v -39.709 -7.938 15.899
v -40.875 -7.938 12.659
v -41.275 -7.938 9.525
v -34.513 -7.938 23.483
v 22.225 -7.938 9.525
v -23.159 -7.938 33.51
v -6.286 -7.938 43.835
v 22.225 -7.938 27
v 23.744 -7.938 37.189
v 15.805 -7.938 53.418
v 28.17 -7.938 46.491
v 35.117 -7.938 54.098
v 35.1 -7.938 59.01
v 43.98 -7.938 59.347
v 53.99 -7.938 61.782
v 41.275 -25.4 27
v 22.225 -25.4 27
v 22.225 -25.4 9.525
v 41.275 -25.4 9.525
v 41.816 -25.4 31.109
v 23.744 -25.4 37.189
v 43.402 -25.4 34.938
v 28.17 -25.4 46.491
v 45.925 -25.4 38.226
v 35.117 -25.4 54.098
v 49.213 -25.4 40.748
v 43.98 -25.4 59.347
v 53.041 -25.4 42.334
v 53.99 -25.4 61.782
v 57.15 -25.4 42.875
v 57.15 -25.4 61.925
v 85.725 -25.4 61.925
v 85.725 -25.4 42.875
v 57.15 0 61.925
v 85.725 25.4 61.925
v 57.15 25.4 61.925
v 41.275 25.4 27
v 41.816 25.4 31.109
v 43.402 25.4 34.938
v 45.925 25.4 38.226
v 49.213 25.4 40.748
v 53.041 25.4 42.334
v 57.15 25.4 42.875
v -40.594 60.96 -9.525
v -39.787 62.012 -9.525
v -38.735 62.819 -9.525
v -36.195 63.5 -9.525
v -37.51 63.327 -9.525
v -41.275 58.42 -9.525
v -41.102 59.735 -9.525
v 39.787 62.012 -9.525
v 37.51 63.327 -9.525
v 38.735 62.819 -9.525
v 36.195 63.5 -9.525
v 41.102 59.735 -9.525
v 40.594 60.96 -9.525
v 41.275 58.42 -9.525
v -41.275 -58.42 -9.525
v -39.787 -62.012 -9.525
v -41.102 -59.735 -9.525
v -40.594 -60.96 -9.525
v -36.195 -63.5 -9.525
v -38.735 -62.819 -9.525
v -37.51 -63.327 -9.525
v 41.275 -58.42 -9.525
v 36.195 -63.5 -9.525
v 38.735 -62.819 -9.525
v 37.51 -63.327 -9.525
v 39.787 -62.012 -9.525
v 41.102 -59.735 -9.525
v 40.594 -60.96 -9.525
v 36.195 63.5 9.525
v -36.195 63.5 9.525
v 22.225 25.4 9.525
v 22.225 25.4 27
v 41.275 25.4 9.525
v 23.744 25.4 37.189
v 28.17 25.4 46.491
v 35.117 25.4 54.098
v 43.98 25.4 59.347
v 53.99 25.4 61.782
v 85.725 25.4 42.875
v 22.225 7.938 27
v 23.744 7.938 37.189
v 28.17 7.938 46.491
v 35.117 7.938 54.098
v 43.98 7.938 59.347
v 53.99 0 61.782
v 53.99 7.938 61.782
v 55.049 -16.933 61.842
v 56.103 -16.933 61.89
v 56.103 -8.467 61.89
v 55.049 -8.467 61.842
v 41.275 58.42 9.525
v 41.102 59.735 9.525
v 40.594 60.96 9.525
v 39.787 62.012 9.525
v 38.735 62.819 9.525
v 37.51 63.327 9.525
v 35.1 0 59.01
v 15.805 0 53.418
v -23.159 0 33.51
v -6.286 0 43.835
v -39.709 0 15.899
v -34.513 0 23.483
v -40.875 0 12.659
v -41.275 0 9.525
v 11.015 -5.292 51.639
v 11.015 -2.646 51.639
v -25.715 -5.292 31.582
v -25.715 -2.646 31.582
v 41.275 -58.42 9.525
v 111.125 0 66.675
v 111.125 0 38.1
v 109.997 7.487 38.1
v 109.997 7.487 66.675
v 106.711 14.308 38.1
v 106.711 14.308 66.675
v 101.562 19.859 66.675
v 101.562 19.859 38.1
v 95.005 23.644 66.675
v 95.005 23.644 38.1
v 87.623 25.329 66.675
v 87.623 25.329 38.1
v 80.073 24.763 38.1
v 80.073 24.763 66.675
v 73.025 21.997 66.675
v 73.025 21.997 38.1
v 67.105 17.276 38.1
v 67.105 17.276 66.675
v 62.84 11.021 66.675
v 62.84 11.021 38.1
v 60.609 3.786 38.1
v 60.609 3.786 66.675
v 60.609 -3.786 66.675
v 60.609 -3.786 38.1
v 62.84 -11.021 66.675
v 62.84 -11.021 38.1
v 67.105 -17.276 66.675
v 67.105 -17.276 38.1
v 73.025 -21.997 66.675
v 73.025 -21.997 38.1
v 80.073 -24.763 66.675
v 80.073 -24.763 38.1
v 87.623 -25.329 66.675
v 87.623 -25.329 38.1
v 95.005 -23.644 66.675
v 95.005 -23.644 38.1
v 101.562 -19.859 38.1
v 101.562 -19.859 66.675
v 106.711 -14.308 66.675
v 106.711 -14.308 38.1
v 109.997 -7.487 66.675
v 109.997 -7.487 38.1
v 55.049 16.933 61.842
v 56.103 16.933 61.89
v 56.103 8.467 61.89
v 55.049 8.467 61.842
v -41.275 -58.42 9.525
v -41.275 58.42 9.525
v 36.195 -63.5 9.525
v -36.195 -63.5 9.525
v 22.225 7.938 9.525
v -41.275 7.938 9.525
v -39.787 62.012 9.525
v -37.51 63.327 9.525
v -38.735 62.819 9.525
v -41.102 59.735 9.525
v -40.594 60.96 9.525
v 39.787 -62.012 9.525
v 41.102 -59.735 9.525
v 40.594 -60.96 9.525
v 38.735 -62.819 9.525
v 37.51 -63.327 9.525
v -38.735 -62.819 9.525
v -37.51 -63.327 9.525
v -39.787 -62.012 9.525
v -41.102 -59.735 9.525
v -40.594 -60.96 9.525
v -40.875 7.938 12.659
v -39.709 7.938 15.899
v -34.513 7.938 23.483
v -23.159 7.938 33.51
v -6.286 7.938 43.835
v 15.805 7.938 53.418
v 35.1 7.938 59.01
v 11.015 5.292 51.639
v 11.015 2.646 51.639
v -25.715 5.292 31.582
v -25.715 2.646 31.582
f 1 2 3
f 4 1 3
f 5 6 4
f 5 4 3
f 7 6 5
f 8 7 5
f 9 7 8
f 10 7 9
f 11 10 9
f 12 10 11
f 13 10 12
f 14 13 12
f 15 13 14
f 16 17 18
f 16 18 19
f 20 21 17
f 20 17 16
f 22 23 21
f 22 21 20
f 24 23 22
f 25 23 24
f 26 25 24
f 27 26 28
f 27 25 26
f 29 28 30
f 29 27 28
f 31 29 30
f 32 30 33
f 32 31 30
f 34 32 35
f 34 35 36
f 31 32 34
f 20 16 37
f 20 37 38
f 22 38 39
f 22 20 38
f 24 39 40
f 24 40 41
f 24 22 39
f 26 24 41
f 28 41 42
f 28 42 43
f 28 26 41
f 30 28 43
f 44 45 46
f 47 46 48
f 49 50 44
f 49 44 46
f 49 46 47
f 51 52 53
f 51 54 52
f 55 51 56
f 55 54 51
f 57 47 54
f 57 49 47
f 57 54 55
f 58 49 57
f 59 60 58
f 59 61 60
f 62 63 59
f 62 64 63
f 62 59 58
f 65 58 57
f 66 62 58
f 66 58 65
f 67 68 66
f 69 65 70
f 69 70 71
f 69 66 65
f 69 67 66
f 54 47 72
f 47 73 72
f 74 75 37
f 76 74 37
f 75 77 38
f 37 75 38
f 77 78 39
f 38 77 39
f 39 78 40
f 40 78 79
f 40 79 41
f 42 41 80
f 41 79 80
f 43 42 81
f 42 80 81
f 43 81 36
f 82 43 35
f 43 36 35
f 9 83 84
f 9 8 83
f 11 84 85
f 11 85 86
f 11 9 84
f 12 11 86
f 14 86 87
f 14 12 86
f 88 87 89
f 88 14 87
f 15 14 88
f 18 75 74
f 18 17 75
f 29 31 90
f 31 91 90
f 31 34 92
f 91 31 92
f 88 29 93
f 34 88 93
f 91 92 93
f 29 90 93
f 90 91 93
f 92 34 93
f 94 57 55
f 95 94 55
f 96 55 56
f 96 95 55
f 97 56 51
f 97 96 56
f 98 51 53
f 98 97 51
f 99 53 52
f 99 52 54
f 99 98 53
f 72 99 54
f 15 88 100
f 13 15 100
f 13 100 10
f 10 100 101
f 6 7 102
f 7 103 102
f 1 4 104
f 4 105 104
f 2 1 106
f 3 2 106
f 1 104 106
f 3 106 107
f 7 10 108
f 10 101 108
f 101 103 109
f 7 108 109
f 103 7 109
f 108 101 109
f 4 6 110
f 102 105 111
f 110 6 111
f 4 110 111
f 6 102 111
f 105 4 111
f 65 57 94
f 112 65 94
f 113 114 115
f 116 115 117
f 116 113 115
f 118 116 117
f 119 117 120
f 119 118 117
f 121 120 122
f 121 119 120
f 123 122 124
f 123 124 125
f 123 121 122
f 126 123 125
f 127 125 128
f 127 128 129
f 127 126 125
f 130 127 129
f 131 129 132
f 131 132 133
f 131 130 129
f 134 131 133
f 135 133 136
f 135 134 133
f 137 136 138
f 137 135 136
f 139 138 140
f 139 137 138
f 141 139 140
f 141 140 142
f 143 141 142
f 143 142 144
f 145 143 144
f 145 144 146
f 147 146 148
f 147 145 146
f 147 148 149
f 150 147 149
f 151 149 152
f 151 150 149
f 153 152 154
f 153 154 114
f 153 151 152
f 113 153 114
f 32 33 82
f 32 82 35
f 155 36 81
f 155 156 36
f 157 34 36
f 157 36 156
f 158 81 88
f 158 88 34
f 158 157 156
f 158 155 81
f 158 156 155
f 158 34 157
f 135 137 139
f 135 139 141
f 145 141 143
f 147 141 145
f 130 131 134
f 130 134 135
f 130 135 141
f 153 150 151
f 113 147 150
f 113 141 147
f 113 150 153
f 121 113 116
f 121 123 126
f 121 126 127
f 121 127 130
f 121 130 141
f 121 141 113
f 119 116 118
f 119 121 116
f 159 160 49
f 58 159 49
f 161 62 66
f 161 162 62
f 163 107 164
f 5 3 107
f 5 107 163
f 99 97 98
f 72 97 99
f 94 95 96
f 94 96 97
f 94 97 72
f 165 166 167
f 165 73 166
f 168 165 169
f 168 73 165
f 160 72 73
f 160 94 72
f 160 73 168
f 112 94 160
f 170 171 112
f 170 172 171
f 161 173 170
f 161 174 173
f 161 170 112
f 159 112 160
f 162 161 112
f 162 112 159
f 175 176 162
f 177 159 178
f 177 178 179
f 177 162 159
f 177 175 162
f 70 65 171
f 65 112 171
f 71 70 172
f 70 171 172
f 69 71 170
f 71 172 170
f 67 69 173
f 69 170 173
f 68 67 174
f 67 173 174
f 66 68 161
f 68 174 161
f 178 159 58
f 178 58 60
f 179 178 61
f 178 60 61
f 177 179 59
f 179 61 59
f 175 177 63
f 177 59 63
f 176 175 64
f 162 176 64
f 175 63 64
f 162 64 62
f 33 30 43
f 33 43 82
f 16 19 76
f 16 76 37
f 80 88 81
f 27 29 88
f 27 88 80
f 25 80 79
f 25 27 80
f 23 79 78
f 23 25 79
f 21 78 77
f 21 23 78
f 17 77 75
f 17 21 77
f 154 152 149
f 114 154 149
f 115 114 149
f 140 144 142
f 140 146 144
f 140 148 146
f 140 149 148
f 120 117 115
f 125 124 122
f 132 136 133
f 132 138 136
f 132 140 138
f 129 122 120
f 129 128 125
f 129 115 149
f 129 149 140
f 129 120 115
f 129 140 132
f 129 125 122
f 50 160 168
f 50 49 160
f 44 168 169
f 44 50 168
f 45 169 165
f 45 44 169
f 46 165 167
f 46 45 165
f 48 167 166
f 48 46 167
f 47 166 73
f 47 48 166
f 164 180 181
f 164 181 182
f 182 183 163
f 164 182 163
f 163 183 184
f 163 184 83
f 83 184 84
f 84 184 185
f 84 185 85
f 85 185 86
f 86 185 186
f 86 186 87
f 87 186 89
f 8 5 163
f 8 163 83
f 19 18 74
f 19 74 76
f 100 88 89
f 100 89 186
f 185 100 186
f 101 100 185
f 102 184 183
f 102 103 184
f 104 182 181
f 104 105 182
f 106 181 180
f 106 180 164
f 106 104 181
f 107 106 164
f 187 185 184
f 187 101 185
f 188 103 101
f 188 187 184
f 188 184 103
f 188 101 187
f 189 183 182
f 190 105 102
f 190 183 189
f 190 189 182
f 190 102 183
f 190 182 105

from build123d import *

# Parameters (mm, degrees)
F1_DEPTH = 63.5
F0_W     = 25.4
F0_H     = 19.05
F2_DEPTH = 25.4
F3_DEPTH = 7.9375
F5_R     = 5.08


with BuildPart() as f1:
    # F0 (on Front) → F1 (new body, symmetric)
    with BuildSketch(Plane.XZ):
        Polygon((22.225, 9.525), (-41.275, 9.525), (-41.275, -9.525), (41.275, -9.525), (41.275, 9.525), align=None)
    extrude(amount=F1_DEPTH, both=True)

    # F5
    f5_edges = [f1.edges().sort_by_distance(p)[0] for p in [
        (41.275, -63.5, 0),
        (-41.275, -63.5, 0),
        (41.275, 63.5, 0),
        (-41.275, 63.5, 0),
    ]]
    fillet(f5_edges, radius=F5_R)


with BuildPart() as f2:
    # F0 (on Front) → F2 (new body, symmetric)
    with BuildSketch(Plane.XZ):
        with BuildLine():
            Line((22.225, 27.0002), (22.225, 9.525))
            Line((22.225, 9.525), (41.275, 9.525))
            Line((41.275, 9.525), (41.275, 27.0002))
            ThreePointArc((41.275, 27.0002), (45.9246798487, 38.2255201513), (57.15, 42.8752))
            Line((57.15, 42.8752), (60.325, 42.8752))
            Line((60.325, 42.8752), (60.325, 61.9252))
            Line((60.325, 61.9252), (57.15, 61.9252))
            add(Edge.make_bspline(
                [(57.15, 61.9252), (56.1060097938, 61.8957039588), (55.0521663877, 61.8477373662), (53.9896285148, 61.7819146943)],
                knots=[0, 0, 0, 0, 2.80861323, 2.80861323, 2.80861323, 2.80861323], degree=3))
            ThreePointArc((53.9896285148, 61.7819146943), (31.3611303163, 50.5520539703), (22.225, 27.0002))
        make_face()
        with Locations((73.025, 52.4002)):
            Rectangle(F0_W, F0_H)
    extrude(amount=F2_DEPTH, both=True)


with BuildPart() as f3:
    # F0 (on Front) → F3 (new body, symmetric)
    with BuildSketch(Plane.XZ):
        with BuildLine():
            add(Edge.make_bspline(
                [(53.9896285148, 61.7819146943), (12.8684326481, 59.2345165701), (-41.275, 29.9429720473), (-41.275, 9.525)],
                knots=[2.80861323, 2.80861323, 2.80861323, 2.80861323, 111.5045361635, 111.5045361635, 111.5045361635, 111.5045361635], degree=3))
            Line((-41.275, 9.525), (22.225, 9.525))
            Line((22.225, 9.525), (22.225, 27.0002))
            ThreePointArc((22.225, 27.0002), (31.3611303163, 50.5520539703), (53.9896285148, 61.7819146943))
        make_face()
    extrude(amount=F3_DEPTH, both=True)


with BuildPart() as f4:
    # F0 (on Front) → F4 (revolve)
    with BuildSketch(Plane.XZ):
        Polygon((85.725, 66.675), (85.725, 61.9252), (85.725, 42.8752), (85.725, 38.1), (111.125, 38.1), (111.125, 66.675), align=None)
    revolve(axis=Axis((85.725, 0, 52.3875), (0, 0, 1)))


solid = Compound([f1.part, f2.part, f3.part, f4.part])
